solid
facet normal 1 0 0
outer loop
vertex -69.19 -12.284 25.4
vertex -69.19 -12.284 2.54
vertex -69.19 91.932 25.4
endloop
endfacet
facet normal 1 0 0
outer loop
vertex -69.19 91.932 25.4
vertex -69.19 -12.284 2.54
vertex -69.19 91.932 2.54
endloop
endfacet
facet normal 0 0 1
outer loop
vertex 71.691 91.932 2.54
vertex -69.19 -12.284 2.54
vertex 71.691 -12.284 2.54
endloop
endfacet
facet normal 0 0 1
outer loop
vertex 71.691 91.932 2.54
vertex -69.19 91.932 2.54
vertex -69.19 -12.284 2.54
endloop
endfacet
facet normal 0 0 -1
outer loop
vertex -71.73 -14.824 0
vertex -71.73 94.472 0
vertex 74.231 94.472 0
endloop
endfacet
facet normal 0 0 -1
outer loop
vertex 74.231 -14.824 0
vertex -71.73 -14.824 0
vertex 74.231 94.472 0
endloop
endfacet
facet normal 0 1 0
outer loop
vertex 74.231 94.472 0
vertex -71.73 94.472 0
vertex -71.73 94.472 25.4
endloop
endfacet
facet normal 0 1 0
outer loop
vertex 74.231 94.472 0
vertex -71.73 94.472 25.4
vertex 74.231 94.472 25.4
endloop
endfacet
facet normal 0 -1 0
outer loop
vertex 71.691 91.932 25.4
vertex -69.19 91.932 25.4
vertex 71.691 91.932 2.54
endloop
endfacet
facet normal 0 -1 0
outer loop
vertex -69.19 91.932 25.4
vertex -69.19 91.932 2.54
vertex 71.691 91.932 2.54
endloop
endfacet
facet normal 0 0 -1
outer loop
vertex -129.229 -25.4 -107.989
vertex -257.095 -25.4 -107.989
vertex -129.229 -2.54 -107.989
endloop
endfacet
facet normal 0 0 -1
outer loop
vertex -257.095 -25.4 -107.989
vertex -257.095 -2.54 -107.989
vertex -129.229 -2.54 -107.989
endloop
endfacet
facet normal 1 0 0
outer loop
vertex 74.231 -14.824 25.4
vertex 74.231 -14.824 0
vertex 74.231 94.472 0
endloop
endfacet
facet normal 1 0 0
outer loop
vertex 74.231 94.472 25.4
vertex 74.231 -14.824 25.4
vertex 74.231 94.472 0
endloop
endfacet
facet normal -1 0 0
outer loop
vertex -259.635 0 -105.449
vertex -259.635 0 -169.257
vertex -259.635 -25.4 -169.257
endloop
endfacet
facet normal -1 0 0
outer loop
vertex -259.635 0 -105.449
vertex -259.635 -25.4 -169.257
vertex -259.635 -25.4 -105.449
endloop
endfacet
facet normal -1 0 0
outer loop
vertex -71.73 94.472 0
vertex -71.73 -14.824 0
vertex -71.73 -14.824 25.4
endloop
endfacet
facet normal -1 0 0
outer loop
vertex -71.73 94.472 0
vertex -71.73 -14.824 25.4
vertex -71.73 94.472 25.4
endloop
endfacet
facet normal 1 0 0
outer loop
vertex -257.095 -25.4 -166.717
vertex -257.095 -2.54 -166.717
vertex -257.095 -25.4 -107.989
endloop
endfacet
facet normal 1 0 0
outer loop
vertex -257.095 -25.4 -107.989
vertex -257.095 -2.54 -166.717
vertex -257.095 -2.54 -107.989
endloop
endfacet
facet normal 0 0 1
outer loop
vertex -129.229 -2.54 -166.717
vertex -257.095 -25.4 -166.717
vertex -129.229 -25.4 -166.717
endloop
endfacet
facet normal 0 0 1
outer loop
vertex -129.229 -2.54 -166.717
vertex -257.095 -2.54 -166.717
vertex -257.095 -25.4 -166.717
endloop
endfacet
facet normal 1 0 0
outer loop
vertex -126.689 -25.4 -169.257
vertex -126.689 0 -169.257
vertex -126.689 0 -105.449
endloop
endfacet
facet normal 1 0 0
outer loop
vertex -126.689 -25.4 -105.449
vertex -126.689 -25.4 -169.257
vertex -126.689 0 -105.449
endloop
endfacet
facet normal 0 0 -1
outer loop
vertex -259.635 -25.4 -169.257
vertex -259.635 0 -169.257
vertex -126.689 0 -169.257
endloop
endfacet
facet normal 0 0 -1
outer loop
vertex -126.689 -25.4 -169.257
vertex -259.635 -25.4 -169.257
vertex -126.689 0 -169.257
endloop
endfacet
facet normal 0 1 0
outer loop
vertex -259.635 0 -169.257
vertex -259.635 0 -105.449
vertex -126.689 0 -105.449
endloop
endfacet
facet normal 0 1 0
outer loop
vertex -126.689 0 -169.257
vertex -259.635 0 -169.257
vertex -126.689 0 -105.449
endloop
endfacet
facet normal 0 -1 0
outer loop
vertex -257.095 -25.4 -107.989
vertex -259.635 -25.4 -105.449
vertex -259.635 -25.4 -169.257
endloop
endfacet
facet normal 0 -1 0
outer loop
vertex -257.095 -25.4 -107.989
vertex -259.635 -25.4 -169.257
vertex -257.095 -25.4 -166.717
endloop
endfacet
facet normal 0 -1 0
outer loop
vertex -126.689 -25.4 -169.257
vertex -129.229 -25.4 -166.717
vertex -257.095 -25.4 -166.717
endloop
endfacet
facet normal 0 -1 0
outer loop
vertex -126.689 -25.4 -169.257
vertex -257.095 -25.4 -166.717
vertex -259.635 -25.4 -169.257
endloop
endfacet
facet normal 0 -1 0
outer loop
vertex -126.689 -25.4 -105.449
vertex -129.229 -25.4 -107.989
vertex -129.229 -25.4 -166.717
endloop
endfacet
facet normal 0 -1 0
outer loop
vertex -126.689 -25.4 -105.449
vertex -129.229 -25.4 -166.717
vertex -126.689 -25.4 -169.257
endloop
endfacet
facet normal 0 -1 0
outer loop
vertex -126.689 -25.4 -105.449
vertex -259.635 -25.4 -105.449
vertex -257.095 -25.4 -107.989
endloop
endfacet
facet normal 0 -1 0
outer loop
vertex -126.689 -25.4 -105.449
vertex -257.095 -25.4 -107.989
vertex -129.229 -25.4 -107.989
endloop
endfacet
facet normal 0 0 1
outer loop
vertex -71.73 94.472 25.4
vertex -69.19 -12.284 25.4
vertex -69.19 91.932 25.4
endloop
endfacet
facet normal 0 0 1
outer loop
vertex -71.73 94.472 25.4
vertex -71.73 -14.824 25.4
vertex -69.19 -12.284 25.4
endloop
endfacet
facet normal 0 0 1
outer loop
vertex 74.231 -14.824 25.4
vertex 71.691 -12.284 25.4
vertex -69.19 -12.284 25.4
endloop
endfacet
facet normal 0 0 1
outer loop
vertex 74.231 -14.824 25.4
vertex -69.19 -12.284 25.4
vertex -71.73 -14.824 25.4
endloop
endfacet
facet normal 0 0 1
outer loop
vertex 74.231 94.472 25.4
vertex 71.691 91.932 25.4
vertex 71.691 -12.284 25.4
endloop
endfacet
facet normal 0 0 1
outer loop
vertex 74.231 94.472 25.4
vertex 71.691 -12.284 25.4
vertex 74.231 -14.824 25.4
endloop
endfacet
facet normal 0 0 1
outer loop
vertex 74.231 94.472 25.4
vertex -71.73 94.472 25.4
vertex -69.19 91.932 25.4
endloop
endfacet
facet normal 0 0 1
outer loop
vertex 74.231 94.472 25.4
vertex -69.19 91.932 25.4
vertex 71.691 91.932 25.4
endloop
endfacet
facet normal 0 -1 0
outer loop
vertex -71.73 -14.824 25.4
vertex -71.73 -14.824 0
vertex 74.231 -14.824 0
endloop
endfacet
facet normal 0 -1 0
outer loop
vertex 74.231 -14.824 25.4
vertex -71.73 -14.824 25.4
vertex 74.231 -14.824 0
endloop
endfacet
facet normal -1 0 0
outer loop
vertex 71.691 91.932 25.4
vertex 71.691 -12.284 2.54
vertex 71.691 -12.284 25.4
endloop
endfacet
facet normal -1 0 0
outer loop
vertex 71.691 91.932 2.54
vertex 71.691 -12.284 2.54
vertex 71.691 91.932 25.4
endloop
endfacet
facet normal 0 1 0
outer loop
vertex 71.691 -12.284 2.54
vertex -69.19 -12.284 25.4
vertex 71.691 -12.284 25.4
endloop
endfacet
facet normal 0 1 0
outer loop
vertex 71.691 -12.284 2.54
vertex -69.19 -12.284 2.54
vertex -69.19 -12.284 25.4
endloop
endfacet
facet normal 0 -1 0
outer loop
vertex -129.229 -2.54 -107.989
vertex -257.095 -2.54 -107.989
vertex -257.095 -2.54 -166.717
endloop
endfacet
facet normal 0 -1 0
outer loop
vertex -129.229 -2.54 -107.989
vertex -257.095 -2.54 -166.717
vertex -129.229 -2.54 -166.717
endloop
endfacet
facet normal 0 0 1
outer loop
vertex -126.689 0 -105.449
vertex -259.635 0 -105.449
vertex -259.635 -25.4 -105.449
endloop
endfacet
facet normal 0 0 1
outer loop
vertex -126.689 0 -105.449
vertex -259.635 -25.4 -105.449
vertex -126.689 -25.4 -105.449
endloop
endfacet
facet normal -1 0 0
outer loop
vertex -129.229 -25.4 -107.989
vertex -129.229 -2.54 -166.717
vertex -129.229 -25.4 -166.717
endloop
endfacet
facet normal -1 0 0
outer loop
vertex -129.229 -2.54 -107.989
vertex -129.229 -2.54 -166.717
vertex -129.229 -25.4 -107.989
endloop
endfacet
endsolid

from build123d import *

# Parameters (mm, degrees)
F0_W     = 145.961307
F0_H     = 109.295826
F1_DEPTH = 25.4
F2_T     = -2.54
F3_W     = 132.945449
F3_H     = 63.807495
F4_DEPTH = 25.4
F5_T     = -2.54


with BuildPart() as f1:
    # F0 (on Top) → F1 (new body)
    with BuildSketch(Plane.XY):
        with Locations((1.250756, 39.823735)):
            Rectangle(F0_W, F0_H)
    extrude(amount=F1_DEPTH)

    # F2
    f2_openings = [f1.faces().sort_by_distance(p)[0] for p in [
        (1.250755, 39.823735, 25.4),
    ]]
    offset(amount=F2_T, openings=f2_openings)


with BuildPart() as f4:
    # F3 (on Front) → F4 (new body)
    with BuildSketch(Plane.XZ):
        with Locations((-193.161949, -137.353088)):
            Rectangle(F3_W, F3_H)
    extrude(amount=F4_DEPTH)

    # F5
    f5_openings = [f4.faces().sort_by_distance(p)[0] for p in [
        (-193.16195, -25.4, -137.353089),
    ]]
    offset(amount=F5_T, openings=f5_openings)


solid = Compound([f1.part, f4.part])
